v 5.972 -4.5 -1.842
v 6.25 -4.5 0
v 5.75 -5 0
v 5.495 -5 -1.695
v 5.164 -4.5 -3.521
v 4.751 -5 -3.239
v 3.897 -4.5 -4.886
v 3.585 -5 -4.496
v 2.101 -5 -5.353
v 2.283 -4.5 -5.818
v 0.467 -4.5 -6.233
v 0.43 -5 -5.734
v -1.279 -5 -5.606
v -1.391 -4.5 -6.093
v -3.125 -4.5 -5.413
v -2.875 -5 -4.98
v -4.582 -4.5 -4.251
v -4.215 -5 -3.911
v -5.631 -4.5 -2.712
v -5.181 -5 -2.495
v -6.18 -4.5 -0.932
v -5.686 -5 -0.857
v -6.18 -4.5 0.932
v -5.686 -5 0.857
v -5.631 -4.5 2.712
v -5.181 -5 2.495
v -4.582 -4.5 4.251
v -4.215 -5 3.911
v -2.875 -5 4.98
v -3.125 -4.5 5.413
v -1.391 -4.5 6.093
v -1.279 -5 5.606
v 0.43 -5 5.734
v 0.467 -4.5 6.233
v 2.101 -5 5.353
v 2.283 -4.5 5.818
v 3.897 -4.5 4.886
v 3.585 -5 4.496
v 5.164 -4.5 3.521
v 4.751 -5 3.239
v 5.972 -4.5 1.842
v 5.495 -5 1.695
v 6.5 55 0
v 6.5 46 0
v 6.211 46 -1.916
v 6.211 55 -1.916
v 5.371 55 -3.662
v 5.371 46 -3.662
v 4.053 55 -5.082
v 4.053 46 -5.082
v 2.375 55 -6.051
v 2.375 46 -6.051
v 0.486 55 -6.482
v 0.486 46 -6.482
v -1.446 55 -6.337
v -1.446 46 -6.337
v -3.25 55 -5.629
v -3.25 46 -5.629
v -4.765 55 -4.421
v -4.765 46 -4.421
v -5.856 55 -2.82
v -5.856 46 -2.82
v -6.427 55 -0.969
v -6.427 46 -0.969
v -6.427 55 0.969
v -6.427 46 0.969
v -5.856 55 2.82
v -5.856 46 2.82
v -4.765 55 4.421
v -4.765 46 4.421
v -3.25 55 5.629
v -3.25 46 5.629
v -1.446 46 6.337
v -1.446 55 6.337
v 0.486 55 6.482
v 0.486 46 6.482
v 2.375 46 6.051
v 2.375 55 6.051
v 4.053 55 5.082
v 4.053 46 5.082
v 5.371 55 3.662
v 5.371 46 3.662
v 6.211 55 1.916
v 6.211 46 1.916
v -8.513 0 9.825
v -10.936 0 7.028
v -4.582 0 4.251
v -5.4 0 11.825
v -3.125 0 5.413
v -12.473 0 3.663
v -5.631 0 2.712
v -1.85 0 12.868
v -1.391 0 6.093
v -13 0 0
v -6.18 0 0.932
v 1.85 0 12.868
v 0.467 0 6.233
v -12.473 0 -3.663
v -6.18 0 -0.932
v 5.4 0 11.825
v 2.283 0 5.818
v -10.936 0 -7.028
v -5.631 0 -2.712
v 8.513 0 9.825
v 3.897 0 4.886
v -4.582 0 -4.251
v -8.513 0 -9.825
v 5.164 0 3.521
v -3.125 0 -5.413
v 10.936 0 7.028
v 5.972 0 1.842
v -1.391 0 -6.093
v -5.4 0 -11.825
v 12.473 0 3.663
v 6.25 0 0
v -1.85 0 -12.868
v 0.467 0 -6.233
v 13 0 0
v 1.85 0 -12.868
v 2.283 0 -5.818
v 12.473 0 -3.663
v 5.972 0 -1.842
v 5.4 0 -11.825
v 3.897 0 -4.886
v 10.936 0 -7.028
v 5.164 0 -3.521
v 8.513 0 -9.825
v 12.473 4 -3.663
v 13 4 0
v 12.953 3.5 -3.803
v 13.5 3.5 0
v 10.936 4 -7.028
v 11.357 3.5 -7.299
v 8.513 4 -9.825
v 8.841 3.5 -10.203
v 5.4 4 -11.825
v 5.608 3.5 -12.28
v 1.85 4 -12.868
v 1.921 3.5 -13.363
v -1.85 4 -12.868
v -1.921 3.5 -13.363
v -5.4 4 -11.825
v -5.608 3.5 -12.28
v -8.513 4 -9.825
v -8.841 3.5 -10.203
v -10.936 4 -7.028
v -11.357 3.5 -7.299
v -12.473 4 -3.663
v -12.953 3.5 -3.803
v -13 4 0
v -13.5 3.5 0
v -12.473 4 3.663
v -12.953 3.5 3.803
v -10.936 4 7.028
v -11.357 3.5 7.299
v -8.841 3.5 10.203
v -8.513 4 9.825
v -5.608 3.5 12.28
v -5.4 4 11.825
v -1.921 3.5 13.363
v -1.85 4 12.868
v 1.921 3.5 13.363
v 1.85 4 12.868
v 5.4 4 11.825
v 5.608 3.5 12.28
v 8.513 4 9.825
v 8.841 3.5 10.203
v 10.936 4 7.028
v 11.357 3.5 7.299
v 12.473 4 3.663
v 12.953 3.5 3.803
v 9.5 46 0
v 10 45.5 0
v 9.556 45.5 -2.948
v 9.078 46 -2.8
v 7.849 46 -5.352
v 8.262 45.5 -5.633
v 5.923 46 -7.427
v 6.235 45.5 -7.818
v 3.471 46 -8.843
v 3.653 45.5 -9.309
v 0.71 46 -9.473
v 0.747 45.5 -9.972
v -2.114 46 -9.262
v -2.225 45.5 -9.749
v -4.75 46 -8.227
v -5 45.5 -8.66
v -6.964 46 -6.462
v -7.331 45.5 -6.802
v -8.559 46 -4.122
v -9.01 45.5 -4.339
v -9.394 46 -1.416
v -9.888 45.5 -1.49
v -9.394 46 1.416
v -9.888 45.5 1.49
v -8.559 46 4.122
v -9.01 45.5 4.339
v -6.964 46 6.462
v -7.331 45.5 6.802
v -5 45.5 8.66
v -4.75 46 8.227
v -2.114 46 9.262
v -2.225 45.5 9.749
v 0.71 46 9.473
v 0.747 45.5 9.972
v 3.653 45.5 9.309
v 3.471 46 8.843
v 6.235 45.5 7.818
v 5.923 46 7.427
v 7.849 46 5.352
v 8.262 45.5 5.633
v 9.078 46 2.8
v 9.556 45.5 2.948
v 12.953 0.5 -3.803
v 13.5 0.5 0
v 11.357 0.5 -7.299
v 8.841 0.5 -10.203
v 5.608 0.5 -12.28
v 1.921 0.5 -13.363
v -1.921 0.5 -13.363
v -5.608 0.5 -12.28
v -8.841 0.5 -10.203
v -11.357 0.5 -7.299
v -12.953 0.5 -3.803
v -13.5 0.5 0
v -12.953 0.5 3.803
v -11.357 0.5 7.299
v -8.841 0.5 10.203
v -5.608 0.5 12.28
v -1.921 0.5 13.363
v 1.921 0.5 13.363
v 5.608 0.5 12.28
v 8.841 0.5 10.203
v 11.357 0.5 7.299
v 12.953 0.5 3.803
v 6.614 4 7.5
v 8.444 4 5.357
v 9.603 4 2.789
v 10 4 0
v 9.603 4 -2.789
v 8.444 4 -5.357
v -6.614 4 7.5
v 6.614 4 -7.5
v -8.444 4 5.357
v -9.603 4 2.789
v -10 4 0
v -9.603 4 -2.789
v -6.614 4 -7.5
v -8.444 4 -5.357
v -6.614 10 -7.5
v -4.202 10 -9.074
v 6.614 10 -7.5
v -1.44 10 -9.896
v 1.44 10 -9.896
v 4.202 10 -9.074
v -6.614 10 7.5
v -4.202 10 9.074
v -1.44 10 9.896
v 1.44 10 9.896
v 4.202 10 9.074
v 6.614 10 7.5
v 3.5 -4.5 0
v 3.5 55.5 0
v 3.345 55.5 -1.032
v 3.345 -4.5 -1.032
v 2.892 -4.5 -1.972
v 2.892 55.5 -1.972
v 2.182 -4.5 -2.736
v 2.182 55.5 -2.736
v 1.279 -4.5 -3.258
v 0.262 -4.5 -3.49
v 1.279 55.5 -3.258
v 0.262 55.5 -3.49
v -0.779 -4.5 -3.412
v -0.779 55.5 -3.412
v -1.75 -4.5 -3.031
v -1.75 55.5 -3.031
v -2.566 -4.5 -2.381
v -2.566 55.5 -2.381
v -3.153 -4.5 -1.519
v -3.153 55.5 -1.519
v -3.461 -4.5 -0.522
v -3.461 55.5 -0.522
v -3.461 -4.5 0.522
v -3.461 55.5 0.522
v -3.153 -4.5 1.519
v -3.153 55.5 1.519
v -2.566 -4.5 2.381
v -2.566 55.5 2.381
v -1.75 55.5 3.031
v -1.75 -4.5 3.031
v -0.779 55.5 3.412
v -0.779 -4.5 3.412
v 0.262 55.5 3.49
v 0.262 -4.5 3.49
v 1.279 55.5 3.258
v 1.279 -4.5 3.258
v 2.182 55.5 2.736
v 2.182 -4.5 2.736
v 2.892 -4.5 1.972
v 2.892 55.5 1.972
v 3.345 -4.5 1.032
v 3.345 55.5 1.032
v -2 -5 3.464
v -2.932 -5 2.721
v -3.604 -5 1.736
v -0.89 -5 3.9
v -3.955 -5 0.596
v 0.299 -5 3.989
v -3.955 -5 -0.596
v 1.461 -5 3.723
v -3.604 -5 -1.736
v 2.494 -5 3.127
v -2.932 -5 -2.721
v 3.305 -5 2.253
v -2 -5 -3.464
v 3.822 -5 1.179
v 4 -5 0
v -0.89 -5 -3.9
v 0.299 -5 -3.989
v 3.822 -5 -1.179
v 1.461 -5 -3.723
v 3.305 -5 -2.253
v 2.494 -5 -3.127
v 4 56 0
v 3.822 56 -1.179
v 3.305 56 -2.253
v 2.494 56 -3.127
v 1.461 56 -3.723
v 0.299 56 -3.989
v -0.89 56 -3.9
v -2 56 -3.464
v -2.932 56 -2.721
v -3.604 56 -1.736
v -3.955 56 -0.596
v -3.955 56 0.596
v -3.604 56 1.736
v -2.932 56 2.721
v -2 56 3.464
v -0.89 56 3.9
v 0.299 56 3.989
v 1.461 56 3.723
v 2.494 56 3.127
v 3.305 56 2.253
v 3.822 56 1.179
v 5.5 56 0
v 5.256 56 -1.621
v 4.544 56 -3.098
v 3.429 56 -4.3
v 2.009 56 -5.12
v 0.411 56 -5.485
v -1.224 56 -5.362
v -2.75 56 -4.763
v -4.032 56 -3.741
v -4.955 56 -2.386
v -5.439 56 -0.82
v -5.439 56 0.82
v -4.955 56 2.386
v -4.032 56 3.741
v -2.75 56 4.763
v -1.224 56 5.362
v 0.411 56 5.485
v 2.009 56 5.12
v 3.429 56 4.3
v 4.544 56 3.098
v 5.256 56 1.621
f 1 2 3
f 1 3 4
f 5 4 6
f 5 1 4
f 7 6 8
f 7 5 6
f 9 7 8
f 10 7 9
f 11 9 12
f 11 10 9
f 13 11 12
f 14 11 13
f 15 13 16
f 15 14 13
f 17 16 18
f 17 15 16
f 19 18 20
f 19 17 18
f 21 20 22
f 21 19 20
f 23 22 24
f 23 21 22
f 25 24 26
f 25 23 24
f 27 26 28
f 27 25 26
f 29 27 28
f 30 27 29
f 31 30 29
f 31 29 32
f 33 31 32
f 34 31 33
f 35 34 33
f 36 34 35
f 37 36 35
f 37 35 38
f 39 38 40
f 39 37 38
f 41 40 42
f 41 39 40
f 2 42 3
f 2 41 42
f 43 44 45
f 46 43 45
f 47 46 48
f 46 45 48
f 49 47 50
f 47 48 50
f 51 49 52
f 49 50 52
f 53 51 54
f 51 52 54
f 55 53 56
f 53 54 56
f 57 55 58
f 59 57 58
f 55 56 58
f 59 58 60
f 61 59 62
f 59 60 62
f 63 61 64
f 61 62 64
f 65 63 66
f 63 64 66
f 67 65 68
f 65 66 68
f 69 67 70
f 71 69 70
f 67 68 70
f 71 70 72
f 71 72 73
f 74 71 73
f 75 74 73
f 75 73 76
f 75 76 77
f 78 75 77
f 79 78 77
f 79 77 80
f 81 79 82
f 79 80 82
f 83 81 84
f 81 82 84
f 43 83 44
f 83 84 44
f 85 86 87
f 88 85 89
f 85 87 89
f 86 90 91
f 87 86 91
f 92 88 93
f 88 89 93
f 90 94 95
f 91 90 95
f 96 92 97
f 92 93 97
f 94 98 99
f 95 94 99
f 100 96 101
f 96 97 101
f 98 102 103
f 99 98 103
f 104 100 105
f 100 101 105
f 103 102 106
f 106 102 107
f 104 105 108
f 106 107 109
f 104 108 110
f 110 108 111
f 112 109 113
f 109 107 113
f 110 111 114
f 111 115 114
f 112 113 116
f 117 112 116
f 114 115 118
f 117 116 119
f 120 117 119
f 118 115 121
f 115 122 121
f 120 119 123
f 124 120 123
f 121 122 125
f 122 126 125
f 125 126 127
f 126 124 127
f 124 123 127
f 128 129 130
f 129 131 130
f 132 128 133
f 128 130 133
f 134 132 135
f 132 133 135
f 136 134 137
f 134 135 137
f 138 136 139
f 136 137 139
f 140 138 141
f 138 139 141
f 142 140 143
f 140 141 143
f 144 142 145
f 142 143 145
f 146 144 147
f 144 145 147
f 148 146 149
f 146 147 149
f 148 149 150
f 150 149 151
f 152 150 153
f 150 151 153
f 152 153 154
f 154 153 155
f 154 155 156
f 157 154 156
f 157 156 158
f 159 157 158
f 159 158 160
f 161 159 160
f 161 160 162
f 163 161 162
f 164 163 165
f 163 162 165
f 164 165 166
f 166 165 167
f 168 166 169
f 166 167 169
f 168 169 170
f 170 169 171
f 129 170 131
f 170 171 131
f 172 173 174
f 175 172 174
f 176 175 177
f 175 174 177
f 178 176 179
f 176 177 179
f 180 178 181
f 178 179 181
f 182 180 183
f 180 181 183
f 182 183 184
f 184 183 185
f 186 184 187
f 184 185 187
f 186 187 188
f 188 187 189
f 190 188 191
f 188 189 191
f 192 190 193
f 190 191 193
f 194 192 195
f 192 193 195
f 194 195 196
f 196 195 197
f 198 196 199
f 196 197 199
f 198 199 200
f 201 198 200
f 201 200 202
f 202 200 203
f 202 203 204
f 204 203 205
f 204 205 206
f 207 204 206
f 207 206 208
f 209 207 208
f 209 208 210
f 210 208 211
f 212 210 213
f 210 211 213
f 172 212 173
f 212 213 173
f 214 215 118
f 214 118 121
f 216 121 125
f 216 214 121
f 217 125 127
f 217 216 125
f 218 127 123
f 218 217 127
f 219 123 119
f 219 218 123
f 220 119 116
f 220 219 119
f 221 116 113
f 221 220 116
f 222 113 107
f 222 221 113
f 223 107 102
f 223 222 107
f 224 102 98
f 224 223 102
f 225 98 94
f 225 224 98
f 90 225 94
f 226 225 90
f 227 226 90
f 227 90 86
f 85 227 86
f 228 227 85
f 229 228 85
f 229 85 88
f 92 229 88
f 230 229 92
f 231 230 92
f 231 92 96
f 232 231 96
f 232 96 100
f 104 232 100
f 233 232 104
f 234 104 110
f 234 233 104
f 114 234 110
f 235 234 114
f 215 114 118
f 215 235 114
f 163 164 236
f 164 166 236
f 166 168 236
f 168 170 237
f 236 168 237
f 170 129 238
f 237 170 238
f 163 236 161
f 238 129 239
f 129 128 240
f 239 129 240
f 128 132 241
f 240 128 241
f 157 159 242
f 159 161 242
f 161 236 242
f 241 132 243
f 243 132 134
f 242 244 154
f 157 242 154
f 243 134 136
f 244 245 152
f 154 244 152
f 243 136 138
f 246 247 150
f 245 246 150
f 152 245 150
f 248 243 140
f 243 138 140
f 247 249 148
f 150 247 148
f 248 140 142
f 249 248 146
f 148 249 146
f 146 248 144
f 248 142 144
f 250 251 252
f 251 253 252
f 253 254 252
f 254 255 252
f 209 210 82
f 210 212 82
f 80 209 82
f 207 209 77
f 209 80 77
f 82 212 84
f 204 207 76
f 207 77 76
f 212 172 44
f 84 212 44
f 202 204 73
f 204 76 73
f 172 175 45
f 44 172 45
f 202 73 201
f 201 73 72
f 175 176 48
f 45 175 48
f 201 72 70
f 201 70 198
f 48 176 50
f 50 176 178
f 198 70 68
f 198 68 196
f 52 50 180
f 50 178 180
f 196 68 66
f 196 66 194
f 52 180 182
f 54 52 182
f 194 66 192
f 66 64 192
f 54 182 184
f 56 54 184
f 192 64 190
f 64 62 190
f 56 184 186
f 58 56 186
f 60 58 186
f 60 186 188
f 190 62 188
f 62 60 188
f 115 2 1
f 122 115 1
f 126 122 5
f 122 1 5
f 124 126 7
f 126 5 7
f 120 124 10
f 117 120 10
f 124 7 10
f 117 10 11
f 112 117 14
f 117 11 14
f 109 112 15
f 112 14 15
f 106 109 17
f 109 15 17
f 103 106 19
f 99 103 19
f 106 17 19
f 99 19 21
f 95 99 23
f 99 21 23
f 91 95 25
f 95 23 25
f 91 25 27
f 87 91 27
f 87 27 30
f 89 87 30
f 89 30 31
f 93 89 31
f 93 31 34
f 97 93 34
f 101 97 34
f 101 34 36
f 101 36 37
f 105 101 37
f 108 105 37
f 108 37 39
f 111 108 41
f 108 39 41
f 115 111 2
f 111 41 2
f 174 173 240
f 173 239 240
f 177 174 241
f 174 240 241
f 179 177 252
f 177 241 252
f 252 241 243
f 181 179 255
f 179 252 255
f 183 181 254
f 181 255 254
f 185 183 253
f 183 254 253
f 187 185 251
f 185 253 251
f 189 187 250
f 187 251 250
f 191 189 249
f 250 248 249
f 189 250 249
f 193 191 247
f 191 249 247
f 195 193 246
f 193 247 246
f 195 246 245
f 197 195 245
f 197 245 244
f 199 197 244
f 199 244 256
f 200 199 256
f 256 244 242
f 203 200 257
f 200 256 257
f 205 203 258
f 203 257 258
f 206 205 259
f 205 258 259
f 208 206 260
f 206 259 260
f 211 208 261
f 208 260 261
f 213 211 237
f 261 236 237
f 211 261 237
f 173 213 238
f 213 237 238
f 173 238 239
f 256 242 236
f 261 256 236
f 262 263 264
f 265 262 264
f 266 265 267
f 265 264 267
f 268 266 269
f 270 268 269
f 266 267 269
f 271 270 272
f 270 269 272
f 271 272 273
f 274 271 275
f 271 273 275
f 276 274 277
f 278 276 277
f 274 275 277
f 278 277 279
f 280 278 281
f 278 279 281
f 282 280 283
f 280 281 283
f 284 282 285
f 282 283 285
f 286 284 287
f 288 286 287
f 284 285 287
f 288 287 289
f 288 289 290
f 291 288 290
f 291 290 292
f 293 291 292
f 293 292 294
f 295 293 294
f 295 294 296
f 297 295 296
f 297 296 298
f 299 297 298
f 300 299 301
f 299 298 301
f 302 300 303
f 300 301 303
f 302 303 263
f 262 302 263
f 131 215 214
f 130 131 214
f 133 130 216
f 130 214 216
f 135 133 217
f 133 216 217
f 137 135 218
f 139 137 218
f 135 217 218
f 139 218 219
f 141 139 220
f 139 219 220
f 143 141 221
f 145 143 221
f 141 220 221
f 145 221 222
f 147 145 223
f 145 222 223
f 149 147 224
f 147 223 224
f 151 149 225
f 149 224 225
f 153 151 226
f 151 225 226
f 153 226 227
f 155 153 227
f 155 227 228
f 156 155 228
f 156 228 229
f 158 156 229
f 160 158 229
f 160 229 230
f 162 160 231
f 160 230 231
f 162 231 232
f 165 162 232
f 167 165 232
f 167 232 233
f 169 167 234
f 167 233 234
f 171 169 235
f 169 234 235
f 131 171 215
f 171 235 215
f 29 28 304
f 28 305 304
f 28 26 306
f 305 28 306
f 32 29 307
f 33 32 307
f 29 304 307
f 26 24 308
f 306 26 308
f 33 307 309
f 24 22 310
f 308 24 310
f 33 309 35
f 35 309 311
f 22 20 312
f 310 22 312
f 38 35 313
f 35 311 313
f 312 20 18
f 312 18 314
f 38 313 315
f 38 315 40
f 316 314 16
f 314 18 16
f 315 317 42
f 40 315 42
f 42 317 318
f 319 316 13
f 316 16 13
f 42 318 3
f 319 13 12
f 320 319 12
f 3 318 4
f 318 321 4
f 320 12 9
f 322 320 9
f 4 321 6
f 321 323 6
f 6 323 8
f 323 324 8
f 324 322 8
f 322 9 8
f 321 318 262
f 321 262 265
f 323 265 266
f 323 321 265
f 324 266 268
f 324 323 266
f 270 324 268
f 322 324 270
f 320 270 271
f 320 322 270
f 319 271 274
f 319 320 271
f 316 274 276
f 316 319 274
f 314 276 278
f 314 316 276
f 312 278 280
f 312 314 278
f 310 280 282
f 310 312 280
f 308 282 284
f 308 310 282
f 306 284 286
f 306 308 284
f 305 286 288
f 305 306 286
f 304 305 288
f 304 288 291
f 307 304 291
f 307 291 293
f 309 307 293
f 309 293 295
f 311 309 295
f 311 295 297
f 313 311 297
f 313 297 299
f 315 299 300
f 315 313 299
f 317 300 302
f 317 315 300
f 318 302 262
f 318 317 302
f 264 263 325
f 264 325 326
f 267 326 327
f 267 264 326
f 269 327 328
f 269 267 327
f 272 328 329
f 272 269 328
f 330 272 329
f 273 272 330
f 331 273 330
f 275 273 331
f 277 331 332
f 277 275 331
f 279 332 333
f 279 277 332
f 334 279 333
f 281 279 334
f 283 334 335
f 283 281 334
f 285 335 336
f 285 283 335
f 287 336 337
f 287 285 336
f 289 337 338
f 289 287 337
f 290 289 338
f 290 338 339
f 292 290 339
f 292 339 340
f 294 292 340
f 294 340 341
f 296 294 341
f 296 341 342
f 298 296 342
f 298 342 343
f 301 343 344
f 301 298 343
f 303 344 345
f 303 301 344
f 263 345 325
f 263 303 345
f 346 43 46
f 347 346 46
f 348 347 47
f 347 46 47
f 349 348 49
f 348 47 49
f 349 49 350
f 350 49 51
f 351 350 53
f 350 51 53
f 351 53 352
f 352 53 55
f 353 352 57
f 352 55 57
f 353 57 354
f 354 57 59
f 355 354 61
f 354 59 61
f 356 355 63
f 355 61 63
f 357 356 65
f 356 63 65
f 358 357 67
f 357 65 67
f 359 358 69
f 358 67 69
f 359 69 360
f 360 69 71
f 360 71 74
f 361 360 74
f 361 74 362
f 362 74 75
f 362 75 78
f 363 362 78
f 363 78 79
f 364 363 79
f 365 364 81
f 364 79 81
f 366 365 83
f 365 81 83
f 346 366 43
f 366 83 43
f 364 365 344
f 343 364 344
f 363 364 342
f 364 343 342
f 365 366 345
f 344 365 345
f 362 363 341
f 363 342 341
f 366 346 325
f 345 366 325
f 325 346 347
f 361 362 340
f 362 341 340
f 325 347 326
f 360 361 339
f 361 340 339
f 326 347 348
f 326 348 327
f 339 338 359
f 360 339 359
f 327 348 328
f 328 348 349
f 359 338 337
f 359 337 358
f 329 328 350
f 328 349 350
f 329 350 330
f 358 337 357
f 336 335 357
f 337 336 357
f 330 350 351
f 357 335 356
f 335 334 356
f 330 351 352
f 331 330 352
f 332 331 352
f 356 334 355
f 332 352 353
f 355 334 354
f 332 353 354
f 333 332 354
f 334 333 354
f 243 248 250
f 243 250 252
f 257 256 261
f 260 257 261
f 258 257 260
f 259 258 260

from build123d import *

# Parameters (mm, degrees)
CHAMFER1_SIZE       = 1
CHAMFER2_SIZE       = 0.5
SKETCH2_OUTSIDE_W   = 43.394
SKETCH2_OUTSIDE_H   = 43.394
SKETCH2_OUTSIDE_W_2 = 33.661520222
SKETCH2_OUTSIDE_H_2 = 15
CUT_EXTRUDE1_DEPTH  = 6


with BuildPart() as part:
    # Sketch1 → Revolve1 (revolve)
    with BuildSketch(Plane.XY):
        Polygon((3.5, -5), (3.5, 56), (6.5, 56), (6.5, 46), (10, 46), (10, 4), (13.5, 4), (13.5, 0), (6.25, 0), (6.25, -5), align=None)
    revolve(axis=Axis((0, 0, 0), (0, 1, 0)))

    # Chamfer1
    chamfer1_edges = [part.edges().sort_by_distance(p)[0] for p in [
        (-6.5, 56, 0),
    ]]
    chamfer(chamfer1_edges, length=CHAMFER1_SIZE)

    # Chamfer2
    chamfer2_edges = [part.edges().sort_by_distance(p)[0] for p in [
        (-10, 46, 0),
        (-3.5, 56, 0),
        (-3.5, -5, 0),
        (-6.25, -5, 0),
        (-13.5, 0, 0),
        (-13.5, 4, 0),
    ]]
    chamfer(chamfer2_edges, length=CHAMFER2_SIZE)

    # Sketch2 outside → Cut-Extrude1 (cut)
    with BuildSketch(Plane(origin=(0, 4, 0), x_dir=(1, 0, 0), z_dir=(0, 1, 0))):
        Rectangle(SKETCH2_OUTSIDE_W, SKETCH2_OUTSIDE_H)
        Rectangle(SKETCH2_OUTSIDE_W_2, SKETCH2_OUTSIDE_H_2, mode=Mode.SUBTRACT)
    extrude(amount=CUT_EXTRUDE1_DEPTH, mode=Mode.SUBTRACT)


solid = part.part
